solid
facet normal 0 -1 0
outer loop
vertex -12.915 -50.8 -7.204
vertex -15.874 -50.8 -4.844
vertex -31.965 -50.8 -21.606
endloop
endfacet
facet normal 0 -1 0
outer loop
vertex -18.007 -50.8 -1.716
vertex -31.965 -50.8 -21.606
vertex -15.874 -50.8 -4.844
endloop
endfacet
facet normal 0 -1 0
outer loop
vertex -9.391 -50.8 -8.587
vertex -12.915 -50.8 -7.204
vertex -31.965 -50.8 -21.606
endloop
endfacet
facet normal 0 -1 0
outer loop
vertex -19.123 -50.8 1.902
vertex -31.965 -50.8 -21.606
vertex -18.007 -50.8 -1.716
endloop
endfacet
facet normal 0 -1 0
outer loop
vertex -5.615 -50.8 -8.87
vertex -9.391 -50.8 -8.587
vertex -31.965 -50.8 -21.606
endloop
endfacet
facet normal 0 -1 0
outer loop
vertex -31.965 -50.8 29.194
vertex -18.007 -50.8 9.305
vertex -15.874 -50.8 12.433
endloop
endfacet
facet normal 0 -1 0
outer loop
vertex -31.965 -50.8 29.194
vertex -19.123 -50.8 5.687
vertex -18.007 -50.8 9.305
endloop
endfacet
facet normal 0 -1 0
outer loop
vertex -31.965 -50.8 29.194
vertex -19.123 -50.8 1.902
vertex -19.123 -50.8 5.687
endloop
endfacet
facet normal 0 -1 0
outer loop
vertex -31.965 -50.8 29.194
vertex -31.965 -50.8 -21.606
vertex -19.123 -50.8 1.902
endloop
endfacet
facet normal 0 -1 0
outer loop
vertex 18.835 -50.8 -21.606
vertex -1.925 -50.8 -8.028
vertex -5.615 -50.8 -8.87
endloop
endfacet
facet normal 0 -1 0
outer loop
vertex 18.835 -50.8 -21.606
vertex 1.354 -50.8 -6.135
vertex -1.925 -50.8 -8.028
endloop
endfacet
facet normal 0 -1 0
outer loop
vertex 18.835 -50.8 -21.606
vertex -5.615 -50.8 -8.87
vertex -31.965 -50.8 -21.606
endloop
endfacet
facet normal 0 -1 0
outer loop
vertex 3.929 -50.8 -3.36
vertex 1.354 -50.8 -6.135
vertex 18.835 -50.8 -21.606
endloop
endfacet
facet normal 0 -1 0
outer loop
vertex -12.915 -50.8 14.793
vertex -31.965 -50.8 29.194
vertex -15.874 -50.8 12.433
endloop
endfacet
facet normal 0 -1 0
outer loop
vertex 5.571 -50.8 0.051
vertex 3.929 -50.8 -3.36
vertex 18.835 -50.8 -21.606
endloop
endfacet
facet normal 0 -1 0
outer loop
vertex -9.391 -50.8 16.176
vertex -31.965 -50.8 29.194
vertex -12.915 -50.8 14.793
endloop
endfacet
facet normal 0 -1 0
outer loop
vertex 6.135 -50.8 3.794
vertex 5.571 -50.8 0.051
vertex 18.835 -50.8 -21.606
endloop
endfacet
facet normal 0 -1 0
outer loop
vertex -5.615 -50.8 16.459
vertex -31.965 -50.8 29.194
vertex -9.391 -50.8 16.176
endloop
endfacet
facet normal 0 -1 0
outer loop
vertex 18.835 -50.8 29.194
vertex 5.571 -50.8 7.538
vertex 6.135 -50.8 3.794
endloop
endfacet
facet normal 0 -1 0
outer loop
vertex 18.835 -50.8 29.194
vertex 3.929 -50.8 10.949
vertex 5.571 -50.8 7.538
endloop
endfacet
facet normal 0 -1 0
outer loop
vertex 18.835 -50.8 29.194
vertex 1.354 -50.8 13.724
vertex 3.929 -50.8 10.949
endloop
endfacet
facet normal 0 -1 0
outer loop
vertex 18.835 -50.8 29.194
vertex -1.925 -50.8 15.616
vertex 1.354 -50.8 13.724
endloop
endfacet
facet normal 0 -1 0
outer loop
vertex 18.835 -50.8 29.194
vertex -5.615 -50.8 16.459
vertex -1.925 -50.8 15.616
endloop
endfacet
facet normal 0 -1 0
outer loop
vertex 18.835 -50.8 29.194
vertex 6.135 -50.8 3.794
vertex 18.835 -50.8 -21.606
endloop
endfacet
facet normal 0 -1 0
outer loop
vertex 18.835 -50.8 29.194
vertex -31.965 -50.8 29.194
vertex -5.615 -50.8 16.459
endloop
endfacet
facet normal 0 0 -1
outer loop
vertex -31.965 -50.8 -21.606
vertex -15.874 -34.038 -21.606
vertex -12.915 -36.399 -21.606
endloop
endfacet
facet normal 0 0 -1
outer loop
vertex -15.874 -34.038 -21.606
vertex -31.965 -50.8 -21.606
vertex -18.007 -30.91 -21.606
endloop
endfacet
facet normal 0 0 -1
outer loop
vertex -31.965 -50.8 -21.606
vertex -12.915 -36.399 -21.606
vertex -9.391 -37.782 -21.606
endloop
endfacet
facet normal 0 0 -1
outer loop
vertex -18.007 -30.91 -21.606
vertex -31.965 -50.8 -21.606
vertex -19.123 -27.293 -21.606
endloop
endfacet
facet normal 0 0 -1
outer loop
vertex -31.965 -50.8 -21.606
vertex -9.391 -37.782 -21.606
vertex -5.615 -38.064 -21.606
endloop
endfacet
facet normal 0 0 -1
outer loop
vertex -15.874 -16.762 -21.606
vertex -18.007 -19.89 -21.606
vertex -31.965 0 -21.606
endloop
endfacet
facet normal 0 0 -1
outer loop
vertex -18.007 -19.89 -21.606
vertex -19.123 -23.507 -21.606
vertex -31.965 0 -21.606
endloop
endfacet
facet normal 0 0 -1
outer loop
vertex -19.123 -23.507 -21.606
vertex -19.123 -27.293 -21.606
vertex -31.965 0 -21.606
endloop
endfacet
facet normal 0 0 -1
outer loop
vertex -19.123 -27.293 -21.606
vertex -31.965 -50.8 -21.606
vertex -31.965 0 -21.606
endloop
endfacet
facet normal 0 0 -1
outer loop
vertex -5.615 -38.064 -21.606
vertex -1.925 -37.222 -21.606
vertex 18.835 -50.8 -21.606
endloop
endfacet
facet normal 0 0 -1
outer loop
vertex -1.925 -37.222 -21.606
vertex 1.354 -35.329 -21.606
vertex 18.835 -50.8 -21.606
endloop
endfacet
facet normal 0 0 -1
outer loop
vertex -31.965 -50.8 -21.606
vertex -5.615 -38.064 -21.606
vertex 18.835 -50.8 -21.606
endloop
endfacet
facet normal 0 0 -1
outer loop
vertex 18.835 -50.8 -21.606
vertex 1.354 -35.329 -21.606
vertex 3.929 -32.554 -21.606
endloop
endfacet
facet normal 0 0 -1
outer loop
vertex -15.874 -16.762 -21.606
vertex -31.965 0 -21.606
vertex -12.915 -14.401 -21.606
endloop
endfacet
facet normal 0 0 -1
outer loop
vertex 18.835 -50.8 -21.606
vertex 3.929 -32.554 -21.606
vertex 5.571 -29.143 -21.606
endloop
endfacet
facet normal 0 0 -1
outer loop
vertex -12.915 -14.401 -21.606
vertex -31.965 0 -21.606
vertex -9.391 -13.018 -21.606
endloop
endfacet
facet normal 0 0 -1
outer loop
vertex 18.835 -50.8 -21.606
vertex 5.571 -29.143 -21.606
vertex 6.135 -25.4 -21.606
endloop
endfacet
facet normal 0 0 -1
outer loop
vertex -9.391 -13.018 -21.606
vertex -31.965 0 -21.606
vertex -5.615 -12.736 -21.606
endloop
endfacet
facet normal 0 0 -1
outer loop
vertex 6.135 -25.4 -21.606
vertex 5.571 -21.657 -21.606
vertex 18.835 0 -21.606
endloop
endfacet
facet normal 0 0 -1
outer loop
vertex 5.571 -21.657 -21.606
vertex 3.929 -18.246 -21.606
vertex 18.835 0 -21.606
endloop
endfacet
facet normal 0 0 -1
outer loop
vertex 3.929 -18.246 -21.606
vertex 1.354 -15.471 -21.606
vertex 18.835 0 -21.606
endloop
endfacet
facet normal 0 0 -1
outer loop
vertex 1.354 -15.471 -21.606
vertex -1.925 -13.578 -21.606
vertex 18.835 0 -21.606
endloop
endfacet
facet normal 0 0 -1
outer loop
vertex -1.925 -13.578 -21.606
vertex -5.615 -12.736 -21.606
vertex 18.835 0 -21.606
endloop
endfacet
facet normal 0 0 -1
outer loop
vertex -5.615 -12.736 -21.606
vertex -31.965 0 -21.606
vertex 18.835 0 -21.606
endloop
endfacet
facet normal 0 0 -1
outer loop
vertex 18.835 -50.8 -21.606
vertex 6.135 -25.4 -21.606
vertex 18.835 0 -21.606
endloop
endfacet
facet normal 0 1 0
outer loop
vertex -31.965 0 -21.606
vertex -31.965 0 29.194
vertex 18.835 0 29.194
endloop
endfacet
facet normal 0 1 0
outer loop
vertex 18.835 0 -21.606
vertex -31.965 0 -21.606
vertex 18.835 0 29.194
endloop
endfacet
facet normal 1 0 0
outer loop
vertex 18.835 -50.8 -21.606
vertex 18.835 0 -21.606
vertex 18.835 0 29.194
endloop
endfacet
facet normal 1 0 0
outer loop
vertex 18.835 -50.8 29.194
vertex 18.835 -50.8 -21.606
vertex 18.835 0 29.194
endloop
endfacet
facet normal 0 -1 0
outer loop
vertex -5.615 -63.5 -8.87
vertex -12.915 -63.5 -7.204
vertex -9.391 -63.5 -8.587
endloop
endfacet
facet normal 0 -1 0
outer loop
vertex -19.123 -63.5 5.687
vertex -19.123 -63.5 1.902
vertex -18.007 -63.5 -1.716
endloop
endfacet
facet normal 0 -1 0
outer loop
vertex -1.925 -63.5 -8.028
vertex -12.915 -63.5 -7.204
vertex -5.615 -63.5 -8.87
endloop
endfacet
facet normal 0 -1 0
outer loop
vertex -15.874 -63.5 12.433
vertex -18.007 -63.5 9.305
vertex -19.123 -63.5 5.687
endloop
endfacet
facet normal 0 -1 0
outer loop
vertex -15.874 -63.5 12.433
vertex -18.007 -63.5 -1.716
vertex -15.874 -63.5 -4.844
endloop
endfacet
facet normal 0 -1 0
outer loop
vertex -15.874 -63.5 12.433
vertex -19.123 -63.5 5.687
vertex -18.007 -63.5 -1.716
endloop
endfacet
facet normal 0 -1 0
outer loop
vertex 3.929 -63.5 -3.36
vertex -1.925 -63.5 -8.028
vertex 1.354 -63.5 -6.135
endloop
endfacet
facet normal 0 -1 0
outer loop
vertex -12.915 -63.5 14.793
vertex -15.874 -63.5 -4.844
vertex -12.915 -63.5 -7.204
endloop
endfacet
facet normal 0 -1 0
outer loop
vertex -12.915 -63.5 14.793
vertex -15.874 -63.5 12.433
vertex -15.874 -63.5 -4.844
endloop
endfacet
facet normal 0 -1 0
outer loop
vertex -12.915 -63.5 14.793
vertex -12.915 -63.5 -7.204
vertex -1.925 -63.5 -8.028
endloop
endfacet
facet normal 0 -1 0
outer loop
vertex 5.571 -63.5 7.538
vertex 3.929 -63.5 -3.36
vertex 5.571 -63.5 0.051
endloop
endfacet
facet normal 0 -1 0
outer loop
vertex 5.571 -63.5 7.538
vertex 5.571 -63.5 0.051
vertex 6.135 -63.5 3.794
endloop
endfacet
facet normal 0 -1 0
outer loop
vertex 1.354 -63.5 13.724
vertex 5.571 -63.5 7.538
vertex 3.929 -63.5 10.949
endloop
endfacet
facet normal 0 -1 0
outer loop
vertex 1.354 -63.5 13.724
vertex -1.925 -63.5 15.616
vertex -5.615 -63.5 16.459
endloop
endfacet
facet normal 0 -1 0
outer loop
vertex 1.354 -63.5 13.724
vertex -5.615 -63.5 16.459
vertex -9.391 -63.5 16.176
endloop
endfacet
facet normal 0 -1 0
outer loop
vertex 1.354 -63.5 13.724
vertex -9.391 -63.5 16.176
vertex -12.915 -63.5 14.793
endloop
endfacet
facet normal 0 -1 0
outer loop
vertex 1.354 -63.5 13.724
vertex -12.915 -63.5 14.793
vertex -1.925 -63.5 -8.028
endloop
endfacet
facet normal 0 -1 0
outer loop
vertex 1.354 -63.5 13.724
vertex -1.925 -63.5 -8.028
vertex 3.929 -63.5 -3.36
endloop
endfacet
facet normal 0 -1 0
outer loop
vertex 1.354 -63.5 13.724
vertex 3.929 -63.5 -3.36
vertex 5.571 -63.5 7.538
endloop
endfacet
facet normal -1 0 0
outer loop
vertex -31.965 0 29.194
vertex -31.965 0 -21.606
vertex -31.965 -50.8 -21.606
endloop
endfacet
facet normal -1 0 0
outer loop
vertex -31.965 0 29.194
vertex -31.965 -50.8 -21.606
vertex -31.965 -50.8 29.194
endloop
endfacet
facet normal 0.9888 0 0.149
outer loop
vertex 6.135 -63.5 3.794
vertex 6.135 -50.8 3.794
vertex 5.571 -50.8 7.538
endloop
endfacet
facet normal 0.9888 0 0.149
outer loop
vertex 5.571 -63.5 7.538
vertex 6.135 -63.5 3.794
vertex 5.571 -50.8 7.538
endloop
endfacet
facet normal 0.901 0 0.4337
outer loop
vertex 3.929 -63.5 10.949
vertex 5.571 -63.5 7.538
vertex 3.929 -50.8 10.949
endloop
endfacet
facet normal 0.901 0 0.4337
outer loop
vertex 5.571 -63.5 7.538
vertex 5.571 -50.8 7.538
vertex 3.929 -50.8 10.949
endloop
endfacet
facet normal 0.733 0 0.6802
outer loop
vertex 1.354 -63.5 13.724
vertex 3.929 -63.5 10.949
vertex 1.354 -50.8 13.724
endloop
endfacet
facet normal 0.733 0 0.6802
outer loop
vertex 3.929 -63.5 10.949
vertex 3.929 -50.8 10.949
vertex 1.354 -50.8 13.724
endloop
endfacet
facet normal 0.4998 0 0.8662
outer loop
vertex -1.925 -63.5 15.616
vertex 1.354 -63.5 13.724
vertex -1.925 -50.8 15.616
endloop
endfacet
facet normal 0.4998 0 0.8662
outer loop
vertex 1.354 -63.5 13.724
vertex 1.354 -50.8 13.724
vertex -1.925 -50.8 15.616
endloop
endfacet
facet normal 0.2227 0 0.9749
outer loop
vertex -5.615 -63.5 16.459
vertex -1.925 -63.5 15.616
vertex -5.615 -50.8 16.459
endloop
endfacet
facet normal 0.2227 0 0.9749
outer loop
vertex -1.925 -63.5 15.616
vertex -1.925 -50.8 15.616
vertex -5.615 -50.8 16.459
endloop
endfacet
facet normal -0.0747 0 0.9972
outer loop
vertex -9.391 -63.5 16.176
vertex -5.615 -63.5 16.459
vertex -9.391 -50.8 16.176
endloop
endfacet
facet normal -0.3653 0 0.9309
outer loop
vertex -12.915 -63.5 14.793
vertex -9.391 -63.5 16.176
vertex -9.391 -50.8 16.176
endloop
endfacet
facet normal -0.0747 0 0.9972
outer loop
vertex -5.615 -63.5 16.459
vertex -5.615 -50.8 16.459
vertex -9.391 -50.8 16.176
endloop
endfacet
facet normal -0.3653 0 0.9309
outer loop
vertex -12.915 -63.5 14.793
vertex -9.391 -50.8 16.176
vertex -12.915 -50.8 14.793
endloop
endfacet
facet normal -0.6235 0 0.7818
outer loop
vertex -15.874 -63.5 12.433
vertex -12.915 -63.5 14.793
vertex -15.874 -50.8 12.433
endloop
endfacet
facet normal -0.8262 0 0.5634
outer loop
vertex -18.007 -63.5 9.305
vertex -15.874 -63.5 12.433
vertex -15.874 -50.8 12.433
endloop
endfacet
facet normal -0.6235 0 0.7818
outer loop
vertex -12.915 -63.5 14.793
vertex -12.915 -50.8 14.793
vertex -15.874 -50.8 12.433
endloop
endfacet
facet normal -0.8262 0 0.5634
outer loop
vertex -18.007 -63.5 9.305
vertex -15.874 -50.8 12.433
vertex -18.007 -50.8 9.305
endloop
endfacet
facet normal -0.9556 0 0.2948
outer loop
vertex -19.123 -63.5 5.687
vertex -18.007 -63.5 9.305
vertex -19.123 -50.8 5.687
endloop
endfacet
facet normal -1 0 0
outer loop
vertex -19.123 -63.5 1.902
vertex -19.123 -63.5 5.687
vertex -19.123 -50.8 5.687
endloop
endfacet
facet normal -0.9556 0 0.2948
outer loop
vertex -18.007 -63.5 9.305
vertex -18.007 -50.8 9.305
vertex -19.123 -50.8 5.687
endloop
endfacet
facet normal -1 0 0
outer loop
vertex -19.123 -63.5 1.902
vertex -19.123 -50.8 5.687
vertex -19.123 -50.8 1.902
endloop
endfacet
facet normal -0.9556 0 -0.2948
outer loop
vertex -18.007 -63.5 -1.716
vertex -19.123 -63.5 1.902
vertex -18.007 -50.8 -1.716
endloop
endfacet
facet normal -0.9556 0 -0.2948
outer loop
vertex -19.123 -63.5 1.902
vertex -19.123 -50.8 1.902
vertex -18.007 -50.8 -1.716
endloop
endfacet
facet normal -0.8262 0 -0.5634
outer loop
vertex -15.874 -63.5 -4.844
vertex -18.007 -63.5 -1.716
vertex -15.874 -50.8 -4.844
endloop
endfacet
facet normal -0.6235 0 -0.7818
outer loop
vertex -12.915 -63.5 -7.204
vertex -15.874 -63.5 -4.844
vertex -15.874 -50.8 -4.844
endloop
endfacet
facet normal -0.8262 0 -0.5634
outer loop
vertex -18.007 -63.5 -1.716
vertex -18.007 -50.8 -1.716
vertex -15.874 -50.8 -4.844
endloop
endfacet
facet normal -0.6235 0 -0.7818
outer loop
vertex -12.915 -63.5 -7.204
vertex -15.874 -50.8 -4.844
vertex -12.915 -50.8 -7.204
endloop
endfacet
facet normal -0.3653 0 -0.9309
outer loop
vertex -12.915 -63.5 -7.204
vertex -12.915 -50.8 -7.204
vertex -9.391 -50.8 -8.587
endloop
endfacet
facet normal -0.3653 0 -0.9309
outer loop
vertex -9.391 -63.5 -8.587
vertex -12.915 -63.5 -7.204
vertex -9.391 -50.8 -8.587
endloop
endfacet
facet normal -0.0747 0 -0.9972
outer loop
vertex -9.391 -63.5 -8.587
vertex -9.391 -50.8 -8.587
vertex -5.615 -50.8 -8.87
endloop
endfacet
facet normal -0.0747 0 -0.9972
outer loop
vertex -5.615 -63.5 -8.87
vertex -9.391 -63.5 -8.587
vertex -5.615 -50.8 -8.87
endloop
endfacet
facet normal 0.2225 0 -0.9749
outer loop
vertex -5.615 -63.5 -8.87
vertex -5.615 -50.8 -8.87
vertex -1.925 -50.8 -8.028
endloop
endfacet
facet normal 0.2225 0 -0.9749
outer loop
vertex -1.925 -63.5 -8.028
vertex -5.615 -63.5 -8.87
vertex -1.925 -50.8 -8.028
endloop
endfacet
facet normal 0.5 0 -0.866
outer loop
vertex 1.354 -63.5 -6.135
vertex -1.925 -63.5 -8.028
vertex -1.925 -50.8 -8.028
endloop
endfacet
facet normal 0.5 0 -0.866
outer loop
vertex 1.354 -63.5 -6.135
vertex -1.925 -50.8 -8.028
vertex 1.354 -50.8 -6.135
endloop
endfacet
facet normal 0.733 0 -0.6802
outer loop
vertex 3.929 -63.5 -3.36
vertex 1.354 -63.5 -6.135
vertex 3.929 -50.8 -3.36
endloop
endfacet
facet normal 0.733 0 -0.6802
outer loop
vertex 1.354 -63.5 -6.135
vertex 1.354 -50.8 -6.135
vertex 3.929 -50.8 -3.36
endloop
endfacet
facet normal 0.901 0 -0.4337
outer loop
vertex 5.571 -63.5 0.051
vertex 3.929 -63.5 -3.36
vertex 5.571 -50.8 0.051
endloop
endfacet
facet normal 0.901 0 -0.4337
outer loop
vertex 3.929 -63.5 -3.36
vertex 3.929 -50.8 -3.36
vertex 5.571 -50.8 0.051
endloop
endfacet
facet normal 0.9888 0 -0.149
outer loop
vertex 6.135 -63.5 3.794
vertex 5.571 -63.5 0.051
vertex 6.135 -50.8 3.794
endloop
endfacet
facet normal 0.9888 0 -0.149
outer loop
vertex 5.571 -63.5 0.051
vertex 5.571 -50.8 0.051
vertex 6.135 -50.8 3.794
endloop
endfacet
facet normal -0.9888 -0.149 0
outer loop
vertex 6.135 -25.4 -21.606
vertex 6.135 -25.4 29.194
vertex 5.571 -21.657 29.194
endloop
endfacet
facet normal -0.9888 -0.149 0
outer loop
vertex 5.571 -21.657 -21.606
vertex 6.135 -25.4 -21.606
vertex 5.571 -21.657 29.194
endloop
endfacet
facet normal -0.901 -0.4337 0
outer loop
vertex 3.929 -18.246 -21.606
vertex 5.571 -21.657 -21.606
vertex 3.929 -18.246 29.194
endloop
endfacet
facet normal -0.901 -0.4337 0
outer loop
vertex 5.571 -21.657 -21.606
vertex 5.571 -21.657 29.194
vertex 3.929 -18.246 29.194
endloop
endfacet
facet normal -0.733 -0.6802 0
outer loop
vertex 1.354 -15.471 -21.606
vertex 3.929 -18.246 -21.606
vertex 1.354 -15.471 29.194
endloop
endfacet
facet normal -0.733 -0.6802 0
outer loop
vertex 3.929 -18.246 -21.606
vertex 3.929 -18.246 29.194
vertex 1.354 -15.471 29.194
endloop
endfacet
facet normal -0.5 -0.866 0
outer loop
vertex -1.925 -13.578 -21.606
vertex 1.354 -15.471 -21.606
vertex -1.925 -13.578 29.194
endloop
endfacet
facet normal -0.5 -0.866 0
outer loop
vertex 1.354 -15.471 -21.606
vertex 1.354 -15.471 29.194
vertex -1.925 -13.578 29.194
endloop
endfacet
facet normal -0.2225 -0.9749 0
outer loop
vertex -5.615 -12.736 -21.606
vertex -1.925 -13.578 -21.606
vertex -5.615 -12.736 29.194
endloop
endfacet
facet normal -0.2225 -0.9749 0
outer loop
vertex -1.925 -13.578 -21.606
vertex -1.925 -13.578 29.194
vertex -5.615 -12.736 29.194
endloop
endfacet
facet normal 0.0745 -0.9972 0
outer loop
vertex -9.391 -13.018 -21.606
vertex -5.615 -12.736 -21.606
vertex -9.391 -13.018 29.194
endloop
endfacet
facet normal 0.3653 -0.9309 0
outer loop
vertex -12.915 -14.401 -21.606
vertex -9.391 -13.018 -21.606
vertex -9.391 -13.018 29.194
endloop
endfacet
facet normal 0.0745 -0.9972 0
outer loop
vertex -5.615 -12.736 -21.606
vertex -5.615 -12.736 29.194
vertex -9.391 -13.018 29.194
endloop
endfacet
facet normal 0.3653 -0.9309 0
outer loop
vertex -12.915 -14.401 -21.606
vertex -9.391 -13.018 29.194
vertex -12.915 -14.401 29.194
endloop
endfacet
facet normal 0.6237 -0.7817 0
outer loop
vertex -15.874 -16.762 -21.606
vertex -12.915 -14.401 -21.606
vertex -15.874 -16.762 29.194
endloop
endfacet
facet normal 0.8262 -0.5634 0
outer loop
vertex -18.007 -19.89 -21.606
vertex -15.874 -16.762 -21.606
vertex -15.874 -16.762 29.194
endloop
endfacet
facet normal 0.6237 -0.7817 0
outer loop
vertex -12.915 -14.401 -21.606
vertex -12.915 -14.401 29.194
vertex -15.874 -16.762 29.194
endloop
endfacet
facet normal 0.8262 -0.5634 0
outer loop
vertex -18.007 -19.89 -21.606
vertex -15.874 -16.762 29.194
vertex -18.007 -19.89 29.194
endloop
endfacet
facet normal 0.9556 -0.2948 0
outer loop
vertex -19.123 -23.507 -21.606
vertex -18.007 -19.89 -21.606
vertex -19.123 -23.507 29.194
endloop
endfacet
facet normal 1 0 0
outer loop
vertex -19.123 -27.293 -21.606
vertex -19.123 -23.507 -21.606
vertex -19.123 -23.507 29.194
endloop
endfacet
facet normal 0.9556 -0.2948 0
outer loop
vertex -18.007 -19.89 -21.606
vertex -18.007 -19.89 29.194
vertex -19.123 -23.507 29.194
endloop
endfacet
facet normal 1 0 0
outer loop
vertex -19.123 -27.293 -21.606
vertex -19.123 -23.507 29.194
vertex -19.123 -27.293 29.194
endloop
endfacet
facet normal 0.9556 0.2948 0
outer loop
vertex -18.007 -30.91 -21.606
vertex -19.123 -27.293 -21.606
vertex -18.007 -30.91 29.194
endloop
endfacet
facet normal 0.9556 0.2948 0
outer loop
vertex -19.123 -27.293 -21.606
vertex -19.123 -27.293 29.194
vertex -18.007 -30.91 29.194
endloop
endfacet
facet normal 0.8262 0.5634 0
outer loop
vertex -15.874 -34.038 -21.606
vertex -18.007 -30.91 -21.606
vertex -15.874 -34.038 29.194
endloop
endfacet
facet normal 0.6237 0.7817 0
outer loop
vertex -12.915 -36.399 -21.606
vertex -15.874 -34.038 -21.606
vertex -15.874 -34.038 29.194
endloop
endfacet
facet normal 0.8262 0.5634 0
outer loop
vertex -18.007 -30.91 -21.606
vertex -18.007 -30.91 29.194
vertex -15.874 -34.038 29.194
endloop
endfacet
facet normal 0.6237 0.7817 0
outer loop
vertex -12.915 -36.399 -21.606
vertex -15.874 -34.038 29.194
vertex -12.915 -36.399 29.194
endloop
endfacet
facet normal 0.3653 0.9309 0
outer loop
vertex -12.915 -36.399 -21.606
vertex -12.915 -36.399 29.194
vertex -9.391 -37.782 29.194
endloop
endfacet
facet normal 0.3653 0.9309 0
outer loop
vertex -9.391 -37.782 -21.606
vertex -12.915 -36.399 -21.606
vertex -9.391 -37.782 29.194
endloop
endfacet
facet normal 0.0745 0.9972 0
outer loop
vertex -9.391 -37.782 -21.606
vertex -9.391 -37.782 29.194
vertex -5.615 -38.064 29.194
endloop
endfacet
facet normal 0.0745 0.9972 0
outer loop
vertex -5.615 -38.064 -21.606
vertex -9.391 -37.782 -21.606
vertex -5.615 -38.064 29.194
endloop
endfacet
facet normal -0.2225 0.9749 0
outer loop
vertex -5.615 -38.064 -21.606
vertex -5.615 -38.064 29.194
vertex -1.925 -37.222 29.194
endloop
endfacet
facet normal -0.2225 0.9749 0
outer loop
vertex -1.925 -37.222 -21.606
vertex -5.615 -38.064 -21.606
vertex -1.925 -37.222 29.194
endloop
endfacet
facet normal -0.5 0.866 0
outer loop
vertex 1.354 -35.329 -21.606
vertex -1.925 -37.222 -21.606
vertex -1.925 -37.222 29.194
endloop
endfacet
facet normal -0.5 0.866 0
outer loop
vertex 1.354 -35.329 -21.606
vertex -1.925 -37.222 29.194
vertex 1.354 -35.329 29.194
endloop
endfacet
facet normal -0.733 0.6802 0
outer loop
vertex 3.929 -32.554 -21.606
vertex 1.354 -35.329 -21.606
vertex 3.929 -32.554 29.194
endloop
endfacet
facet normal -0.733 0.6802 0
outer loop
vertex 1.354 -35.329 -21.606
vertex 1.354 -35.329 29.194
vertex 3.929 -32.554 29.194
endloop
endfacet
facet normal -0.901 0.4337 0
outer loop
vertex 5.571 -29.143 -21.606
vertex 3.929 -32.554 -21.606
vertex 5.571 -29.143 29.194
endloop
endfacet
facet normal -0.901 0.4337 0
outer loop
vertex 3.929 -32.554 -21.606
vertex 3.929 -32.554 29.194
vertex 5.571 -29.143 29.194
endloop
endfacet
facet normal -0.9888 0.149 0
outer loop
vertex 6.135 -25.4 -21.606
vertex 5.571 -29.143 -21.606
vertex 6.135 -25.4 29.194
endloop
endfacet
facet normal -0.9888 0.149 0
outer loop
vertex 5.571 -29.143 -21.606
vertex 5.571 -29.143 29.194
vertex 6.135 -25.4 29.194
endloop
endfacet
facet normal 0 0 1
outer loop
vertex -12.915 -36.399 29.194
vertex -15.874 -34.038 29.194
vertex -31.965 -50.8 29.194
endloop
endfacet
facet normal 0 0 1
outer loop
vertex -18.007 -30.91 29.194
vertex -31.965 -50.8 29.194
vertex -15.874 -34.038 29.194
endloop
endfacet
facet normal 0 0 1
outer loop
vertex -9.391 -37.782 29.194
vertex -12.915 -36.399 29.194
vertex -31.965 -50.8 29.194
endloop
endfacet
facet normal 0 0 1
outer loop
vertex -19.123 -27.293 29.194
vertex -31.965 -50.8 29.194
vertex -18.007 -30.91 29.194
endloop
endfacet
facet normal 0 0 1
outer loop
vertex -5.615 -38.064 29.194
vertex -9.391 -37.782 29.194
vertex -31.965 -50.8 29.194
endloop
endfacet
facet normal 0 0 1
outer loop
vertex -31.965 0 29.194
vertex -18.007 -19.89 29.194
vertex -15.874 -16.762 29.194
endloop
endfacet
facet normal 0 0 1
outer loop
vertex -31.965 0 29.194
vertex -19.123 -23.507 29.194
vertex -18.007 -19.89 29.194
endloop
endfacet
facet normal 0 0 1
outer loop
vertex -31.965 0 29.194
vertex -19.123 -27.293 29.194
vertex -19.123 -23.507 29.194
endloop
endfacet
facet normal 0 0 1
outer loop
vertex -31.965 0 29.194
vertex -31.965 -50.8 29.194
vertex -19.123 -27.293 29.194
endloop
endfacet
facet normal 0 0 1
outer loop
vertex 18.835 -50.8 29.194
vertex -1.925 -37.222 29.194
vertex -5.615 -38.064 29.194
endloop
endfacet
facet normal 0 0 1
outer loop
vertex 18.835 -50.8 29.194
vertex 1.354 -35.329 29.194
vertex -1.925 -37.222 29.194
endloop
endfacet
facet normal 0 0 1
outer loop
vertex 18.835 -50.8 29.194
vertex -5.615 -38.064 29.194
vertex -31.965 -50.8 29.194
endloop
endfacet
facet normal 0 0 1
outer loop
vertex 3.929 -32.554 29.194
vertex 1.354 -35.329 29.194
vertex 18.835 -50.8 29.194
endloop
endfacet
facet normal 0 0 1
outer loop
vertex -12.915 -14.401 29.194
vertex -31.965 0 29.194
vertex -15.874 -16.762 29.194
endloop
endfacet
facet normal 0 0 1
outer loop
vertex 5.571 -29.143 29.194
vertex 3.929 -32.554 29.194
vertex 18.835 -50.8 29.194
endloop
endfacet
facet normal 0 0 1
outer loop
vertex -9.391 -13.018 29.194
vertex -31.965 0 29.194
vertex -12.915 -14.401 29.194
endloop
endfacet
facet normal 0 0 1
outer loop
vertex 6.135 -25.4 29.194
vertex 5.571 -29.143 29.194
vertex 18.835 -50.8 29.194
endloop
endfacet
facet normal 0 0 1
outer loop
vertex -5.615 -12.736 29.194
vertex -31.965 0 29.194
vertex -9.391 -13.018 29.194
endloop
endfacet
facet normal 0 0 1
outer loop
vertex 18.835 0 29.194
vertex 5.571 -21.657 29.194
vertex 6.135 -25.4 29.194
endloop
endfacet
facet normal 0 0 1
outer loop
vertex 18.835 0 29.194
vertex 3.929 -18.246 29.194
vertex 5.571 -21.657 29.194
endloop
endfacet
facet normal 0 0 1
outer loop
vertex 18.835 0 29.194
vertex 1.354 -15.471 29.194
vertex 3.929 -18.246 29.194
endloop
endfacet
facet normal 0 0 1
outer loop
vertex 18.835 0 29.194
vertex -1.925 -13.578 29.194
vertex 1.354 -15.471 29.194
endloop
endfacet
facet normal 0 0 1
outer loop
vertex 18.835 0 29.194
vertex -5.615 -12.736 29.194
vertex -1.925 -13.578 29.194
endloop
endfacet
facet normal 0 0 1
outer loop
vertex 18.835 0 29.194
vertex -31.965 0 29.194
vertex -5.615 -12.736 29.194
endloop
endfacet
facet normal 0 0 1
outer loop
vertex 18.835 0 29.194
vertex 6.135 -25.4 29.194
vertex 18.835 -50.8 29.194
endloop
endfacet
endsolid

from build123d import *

# Parameters (mm, degrees)
F0_W     = 50.8
F0_H     = 50.8
F1_DEPTH = 50.8
F2_R     = 12.7
F3_DEPTH = 12.7
F4_R     = 12.7
F5_DEPTH = 50.8


with BuildPart() as f1:
    # F0 (on Front) → F1 (new body)
    with BuildSketch(Plane.XZ):
        with Locations((-6.564537, 3.794339)):
            Rectangle(F0_W, F0_H)
    extrude(amount=F1_DEPTH)

    # F2 (on face) → F3 (join)
    with BuildSketch(Plane.XZ.offset(50.8)):
        with Locations((-6.564537, 3.794339)):
            Circle(F2_R)
    extrude(amount=F3_DEPTH)

    # F4 (on face) → F5 (cut)
    with BuildSketch(Plane.XY.offset(29.194339)):
        with Locations((-6.564537, -25.4)):
            Circle(F4_R)
    extrude(amount=-F5_DEPTH, mode=Mode.SUBTRACT)


solid = f1.part
